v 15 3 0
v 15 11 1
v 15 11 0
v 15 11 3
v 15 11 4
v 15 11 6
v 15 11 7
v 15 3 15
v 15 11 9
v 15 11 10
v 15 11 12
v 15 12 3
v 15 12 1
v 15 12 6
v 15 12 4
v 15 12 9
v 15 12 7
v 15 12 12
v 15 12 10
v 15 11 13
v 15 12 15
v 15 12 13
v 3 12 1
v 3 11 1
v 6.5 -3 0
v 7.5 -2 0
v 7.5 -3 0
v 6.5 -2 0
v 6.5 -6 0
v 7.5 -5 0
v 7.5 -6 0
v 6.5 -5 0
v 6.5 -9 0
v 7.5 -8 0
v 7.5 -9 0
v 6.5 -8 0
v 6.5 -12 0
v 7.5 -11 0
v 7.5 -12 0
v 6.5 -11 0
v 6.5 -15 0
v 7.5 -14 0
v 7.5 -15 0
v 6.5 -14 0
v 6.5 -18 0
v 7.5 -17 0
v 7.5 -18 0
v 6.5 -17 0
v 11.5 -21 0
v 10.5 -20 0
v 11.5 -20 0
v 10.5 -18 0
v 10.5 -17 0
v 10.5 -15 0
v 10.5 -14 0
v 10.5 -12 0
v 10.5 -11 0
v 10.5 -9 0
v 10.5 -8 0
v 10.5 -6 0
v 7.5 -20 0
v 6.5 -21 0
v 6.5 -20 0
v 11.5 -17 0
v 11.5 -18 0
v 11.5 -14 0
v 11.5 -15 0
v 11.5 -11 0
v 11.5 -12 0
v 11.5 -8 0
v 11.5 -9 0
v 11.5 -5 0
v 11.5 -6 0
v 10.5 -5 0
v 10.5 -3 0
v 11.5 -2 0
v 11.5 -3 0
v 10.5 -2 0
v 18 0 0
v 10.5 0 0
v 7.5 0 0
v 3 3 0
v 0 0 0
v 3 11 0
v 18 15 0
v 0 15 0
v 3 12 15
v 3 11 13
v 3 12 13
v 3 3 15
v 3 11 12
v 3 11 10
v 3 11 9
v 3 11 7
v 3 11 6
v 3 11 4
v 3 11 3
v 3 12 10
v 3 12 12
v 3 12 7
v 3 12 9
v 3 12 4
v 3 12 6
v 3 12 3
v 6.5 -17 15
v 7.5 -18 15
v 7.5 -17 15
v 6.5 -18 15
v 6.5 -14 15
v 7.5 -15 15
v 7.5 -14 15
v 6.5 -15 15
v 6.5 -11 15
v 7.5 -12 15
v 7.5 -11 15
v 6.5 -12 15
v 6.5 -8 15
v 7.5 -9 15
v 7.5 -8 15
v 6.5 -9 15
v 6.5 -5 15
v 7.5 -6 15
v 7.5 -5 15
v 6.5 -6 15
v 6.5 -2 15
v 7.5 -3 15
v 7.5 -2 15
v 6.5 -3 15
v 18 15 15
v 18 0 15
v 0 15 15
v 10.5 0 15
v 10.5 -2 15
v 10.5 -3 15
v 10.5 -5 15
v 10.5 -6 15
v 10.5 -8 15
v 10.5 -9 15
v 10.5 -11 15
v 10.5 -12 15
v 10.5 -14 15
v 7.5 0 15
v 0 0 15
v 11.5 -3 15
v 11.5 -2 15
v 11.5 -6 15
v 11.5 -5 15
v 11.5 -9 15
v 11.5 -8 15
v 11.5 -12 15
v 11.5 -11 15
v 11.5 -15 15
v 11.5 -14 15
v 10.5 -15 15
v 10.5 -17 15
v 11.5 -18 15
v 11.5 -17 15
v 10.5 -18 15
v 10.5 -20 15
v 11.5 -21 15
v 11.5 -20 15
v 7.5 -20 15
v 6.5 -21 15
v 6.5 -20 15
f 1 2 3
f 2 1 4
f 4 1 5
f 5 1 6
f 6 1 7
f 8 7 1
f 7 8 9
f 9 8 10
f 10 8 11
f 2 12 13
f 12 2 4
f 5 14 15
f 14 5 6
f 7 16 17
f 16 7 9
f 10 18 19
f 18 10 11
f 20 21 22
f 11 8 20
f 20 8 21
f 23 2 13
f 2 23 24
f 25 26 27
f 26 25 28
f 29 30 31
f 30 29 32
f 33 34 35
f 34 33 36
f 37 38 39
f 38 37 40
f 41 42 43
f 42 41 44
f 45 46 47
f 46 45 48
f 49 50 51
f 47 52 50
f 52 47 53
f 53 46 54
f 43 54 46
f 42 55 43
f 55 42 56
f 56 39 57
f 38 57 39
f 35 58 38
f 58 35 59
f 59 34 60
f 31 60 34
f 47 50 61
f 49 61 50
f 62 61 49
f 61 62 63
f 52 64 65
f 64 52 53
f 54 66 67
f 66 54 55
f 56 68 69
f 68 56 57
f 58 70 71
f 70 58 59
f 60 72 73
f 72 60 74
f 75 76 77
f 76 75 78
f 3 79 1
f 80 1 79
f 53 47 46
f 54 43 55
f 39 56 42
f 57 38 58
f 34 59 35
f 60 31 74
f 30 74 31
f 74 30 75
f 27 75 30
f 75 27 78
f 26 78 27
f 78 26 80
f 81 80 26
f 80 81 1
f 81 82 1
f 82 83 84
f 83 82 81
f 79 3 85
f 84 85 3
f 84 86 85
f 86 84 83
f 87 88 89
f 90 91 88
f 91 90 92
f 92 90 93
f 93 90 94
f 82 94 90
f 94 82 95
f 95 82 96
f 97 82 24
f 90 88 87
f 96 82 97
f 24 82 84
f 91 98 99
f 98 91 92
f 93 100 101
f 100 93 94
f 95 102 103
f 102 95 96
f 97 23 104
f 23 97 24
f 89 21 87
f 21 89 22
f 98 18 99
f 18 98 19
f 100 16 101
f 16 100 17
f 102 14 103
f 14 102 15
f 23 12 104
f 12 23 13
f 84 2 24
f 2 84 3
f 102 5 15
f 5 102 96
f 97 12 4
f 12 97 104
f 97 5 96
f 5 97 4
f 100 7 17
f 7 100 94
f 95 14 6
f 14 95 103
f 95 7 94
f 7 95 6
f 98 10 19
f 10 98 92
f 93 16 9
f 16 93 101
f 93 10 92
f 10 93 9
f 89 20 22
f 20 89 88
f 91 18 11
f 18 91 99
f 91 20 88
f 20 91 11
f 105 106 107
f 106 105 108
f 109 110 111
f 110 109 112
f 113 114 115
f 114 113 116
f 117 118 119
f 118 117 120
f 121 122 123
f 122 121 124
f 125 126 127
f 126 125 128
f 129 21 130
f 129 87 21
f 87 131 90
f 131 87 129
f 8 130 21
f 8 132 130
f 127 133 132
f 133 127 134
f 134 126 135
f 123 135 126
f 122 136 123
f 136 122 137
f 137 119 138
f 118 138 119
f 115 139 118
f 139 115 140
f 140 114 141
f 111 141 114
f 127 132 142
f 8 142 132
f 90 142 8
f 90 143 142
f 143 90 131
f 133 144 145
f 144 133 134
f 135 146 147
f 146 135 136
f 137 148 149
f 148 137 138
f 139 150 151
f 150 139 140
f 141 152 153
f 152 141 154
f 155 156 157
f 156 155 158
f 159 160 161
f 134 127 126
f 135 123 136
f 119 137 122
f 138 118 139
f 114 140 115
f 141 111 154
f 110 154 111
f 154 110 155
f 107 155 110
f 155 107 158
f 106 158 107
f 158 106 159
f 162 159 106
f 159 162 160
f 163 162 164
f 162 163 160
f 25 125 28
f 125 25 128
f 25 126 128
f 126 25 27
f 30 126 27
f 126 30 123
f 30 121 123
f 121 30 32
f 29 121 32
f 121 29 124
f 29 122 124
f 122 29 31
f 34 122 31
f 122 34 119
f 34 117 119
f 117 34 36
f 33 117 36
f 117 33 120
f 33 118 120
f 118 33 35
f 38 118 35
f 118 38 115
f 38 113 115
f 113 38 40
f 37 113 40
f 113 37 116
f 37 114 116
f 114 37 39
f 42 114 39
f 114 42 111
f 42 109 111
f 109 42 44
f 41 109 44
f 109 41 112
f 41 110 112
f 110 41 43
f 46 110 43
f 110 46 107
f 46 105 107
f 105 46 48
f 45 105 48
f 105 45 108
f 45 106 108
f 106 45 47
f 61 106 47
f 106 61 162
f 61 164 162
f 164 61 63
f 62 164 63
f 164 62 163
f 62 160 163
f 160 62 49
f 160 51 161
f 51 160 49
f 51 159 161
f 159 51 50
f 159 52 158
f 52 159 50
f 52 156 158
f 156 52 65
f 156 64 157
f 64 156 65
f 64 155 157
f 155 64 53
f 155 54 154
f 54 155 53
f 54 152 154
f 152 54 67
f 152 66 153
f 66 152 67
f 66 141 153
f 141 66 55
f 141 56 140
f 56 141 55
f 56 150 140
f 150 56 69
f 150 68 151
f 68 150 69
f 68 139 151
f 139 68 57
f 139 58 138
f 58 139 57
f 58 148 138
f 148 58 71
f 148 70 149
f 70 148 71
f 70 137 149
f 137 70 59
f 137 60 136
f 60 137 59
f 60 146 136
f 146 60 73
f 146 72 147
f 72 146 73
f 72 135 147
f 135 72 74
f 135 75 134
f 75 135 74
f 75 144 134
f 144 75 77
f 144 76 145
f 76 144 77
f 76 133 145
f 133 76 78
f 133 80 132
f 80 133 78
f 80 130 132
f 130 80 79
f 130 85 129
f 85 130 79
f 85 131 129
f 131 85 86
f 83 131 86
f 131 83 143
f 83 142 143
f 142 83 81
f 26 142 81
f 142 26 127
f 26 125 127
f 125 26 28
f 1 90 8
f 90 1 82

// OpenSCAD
// Mount Lasso
// Holds the fan holder on the arm mount
// Teeth allow the position of fan's height and distance from printer to be adjusted

module mountLasso() {
    thickness = 3;
    rectHoleLength = 12;
    rectHoleHeight = 9;
    armLength = 21;
    armThickness = 3;
    teethLength = 1;
    teethHeight = 1;
    grooveLength = 2;
    componentWidth = 15;

    linear_extrude(height=componentWidth){
        // main rectangle hole
        square([rectHoleLength+(2*thickness),thickness]);
        translate([0,thickness]) square([thickness,rectHoleHeight]);
        translate([0,rectHoleHeight+thickness])
            square([rectHoleLength+(2*thickness),thickness]);
        translate([rectHoleLength+thickness,thickness])
            square([thickness,rectHoleHeight]);
        // add arm
        translate([(rectHoleLength/2)+(armThickness/2),-armLength])
            square([armThickness,armLength]);
        // add teeth to arm
        numArmTeeth = round(armLength/(grooveLength+teethLength));
        translate([(rectHoleLength/2)+(armThickness/2)-teethHeight,-armLength])
            for(idx=[0:numArmTeeth-1]) {
                translate([0,idx*(grooveLength+teethLength)]) {
                    square([(teethHeight*2)+armThickness, teethLength]);
                }
            }
    }
    // add teeth to the top of the rectangle hole
    numRectHoleTeeth = round(componentWidth/(grooveLength+teethLength));
    for(idx=[0:numRectHoleTeeth-1]) {
        translate([thickness,rectHoleHeight+thickness-teethHeight,idx*(grooveLength+teethLength)]) {
            cube([rectHoleLength, teethHeight, teethLength]);
        }
    }
}
mountLasso();
